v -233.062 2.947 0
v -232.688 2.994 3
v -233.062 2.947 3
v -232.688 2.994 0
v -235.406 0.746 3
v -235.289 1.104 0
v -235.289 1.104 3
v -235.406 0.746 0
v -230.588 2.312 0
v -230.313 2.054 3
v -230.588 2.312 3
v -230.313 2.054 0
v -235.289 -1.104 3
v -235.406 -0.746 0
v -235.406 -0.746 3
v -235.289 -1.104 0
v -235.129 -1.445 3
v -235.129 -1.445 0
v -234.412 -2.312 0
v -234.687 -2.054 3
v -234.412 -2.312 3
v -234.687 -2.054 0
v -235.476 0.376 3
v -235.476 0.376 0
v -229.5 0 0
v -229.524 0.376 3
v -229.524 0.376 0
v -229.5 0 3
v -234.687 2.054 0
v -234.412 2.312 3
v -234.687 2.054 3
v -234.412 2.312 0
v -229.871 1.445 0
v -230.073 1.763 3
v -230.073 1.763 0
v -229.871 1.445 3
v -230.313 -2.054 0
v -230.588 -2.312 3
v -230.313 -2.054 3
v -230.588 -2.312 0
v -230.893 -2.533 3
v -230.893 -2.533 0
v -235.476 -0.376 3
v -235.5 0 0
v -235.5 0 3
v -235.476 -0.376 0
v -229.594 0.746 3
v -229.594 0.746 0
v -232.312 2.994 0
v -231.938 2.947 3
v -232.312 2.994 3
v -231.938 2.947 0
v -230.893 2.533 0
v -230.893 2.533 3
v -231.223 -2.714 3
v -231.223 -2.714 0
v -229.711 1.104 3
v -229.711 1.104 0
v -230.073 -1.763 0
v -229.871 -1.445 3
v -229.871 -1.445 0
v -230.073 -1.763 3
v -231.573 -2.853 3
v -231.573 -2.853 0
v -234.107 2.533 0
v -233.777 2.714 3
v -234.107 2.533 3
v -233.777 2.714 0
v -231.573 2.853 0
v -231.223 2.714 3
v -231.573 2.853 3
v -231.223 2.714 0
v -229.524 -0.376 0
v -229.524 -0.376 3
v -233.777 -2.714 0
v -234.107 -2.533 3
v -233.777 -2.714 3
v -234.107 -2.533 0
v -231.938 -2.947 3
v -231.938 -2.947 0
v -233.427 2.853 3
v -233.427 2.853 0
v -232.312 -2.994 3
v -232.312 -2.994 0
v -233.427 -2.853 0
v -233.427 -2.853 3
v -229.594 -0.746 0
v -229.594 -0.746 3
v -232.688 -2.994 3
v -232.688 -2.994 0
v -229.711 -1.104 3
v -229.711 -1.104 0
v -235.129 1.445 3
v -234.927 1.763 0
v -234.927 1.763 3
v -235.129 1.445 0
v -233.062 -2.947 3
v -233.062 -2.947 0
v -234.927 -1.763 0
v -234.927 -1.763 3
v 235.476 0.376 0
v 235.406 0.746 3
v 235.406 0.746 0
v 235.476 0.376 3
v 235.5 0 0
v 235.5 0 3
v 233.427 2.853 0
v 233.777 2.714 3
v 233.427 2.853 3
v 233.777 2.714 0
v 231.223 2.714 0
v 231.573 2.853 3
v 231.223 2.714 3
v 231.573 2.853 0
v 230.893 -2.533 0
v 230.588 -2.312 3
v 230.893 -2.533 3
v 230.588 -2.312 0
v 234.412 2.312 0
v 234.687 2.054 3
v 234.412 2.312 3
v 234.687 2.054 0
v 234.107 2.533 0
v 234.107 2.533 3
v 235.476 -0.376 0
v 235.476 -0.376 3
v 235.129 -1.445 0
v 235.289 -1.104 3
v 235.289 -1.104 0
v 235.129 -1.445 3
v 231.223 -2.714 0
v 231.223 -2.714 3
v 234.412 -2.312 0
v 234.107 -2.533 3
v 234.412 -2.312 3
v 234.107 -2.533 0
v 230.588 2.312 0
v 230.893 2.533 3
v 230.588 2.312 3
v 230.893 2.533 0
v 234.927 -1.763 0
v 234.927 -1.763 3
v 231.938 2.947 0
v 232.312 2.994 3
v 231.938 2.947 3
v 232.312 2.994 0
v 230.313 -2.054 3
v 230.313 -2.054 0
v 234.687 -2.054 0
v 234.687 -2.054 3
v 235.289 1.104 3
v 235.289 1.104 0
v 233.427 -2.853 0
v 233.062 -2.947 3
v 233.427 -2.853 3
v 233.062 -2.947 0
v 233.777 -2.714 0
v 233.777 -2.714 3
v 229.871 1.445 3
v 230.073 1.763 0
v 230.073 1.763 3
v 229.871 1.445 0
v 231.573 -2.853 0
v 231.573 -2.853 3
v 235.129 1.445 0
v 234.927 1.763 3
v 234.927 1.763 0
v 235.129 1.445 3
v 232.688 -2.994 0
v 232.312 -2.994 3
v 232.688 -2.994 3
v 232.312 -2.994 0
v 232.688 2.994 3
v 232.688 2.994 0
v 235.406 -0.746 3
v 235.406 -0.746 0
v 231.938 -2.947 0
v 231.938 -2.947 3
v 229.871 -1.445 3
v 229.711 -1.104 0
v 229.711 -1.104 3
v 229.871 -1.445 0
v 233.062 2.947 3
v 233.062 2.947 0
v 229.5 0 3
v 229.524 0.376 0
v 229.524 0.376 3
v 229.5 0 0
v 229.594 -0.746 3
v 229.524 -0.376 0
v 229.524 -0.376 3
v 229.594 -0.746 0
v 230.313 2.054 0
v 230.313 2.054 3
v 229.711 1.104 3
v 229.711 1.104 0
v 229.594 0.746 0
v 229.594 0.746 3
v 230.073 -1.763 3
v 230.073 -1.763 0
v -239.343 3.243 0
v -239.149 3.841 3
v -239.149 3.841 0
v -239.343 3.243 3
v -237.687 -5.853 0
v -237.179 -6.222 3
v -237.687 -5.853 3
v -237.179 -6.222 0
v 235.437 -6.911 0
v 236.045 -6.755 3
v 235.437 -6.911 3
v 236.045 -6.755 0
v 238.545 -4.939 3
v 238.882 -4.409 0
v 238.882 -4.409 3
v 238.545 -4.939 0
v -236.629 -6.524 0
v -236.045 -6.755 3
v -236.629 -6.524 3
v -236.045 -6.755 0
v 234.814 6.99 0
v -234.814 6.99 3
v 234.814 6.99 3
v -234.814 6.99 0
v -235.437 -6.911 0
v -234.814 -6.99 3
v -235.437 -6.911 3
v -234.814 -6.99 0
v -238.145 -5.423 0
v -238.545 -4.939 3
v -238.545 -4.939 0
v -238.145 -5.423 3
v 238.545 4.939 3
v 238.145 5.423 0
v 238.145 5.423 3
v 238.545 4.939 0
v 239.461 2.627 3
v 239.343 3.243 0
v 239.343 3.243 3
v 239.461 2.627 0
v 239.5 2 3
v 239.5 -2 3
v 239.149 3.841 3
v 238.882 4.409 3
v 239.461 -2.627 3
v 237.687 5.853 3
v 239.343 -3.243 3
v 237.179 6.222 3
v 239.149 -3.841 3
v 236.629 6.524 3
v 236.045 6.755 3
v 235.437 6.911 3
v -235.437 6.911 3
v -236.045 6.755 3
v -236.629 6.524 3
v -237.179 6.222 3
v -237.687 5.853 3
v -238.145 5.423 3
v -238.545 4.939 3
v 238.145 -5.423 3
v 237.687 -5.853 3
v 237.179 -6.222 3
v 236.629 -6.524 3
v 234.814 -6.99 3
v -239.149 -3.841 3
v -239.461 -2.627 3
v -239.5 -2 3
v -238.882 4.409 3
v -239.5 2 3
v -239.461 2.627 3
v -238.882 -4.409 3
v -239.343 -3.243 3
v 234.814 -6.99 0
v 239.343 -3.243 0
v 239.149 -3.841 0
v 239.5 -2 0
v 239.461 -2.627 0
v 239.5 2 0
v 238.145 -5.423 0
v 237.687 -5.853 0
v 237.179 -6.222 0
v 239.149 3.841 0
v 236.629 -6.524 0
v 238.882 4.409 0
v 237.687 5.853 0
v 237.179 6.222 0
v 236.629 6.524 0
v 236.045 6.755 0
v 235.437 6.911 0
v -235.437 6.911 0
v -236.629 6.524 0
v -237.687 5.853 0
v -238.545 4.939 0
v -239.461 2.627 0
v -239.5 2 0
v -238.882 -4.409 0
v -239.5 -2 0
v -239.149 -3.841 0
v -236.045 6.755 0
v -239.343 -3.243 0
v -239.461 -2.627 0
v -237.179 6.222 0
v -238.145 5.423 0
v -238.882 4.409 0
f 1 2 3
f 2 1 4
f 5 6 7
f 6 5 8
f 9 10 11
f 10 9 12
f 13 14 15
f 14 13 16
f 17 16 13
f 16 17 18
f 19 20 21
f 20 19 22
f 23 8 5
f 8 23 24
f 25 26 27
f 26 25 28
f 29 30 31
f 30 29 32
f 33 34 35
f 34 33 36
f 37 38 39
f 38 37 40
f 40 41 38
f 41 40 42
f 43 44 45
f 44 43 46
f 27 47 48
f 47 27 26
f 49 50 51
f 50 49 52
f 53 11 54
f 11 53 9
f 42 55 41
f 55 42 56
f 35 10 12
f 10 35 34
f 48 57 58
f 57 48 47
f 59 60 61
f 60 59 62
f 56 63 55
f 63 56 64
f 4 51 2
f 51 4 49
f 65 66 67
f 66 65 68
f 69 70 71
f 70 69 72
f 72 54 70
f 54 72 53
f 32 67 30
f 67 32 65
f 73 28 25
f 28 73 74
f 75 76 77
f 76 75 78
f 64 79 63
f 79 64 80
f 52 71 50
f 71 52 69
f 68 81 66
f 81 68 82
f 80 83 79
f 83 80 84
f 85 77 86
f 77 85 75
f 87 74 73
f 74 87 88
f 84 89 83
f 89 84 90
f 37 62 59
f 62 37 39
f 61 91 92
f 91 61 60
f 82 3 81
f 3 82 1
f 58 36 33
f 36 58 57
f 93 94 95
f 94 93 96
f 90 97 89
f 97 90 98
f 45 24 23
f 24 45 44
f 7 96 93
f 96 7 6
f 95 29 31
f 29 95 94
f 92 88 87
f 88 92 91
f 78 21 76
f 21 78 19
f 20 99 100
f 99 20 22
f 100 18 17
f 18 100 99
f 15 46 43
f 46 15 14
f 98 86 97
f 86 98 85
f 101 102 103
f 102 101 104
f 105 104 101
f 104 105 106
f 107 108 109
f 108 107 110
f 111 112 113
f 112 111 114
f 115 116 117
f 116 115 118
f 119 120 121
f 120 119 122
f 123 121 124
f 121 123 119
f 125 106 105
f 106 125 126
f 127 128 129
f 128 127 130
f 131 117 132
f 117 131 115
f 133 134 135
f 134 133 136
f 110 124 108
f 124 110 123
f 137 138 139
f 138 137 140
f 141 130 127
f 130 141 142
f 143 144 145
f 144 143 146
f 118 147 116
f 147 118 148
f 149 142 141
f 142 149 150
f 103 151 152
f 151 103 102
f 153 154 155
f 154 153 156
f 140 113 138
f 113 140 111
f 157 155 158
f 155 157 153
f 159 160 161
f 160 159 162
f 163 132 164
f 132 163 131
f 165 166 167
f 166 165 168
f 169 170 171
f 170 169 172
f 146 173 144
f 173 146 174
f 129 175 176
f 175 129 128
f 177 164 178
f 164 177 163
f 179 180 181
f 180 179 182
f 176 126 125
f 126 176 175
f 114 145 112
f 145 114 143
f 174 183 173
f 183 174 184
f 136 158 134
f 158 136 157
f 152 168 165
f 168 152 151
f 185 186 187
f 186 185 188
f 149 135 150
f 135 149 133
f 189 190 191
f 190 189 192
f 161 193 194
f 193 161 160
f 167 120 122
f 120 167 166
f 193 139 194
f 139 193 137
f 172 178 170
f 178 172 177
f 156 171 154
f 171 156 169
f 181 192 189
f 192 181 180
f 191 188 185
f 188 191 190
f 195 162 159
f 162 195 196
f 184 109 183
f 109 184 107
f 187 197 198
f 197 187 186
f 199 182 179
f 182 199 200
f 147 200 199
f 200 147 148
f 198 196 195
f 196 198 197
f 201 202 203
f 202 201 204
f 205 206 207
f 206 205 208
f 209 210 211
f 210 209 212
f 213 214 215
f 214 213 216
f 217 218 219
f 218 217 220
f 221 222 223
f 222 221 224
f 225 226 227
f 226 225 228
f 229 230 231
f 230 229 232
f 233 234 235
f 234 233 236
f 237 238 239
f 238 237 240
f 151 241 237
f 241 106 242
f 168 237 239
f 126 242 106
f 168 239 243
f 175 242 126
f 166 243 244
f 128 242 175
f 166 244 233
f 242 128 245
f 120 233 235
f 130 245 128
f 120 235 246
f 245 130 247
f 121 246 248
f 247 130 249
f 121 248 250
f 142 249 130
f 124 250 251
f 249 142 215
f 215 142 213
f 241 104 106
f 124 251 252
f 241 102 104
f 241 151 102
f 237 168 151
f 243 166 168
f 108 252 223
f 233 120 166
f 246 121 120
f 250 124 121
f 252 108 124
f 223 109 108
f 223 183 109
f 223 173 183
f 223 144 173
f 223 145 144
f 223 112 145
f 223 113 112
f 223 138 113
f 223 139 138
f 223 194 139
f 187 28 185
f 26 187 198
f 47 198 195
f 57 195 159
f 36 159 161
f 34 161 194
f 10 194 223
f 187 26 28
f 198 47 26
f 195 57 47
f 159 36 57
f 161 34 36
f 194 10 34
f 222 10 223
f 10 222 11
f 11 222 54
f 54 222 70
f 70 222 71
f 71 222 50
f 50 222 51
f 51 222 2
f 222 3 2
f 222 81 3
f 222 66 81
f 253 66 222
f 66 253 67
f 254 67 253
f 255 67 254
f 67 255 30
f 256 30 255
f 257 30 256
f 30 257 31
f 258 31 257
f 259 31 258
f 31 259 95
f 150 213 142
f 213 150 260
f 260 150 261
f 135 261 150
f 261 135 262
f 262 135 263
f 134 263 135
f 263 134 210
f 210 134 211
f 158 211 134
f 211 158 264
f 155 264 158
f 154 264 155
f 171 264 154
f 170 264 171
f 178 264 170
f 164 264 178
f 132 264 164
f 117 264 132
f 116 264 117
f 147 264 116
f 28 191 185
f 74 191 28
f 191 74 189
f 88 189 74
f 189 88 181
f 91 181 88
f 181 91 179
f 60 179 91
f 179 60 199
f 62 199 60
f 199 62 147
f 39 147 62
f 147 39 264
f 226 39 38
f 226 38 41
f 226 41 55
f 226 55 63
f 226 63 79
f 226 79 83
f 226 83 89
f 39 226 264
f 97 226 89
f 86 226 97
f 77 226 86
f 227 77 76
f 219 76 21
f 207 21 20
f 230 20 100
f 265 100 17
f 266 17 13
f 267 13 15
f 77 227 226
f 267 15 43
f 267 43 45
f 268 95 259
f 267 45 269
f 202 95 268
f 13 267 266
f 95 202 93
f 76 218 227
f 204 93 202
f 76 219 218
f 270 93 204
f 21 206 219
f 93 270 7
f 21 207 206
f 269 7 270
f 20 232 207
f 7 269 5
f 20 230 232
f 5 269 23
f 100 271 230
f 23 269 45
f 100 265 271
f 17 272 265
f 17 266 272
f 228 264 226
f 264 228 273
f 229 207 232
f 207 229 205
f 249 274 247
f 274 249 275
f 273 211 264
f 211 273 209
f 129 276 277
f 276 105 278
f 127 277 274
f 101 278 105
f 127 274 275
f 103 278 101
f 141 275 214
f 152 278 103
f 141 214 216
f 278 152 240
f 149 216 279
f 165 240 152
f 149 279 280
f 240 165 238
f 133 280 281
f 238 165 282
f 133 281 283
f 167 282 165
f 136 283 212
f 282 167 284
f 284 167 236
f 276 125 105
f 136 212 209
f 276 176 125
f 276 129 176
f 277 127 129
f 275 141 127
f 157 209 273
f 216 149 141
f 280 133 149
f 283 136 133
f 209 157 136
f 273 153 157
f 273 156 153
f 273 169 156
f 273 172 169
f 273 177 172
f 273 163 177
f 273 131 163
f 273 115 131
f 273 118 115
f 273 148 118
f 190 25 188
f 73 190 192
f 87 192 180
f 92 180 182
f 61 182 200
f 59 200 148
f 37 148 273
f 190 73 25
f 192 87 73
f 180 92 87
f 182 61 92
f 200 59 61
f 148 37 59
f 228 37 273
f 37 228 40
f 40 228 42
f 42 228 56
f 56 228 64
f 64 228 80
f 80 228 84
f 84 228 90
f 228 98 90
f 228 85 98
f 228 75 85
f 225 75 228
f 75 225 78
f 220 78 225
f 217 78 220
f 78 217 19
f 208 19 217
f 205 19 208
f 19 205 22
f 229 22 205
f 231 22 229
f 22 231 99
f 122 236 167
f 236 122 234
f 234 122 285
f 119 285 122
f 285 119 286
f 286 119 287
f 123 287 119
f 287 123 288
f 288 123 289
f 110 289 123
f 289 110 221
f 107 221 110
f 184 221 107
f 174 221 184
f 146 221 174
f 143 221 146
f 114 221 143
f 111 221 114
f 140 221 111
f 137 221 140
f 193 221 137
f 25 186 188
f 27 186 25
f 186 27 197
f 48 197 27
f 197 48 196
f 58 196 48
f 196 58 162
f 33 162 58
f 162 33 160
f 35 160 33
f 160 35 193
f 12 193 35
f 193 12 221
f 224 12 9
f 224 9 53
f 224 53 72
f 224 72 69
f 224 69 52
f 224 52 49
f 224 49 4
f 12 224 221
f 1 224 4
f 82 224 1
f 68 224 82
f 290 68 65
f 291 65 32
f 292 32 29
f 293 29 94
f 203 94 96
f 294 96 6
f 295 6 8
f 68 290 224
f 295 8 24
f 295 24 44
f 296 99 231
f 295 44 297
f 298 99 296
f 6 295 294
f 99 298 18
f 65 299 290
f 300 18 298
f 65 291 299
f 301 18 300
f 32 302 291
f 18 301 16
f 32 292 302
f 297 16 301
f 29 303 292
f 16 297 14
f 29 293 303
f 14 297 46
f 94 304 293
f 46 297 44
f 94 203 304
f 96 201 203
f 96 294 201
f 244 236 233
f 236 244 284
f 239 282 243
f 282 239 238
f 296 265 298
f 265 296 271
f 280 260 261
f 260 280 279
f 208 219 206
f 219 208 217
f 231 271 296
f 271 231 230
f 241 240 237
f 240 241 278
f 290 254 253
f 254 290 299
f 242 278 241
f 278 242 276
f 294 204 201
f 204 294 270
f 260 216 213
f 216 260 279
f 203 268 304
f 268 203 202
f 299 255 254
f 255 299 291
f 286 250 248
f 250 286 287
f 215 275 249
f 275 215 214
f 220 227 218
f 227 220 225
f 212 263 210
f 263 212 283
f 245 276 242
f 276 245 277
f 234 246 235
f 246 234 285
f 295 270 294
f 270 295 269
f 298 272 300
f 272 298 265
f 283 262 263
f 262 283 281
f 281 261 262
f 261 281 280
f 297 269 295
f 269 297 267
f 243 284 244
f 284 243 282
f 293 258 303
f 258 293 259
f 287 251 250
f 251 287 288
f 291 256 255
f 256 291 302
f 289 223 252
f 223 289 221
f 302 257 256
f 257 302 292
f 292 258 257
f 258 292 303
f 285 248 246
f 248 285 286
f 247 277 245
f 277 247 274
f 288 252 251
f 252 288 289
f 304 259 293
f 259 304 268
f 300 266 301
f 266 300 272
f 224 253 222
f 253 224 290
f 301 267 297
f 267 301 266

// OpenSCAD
$fn = 50;


difference() {
	union() {
		hull() {
			translate(v = [-234.5000000000, 2.0000000000, 0]) {
				cylinder(h = 3, r = 5);
			}
			translate(v = [234.5000000000, 2.0000000000, 0]) {
				cylinder(h = 3, r = 5);
			}
			translate(v = [-234.5000000000, -2.0000000000, 0]) {
				cylinder(h = 3, r = 5);
			}
			translate(v = [234.5000000000, -2.0000000000, 0]) {
				cylinder(h = 3, r = 5);
			}
		}
	}
	union() {
		translate(v = [-232.5000000000, 0.0000000000, -100.0000000000]) {
			cylinder(h = 200, r = 3.0000000000);
		}
		translate(v = [-232.5000000000, 0.0000000000, -100.0000000000]) {
			cylinder(h = 200, r = 3.0000000000);
		}
		translate(v = [232.5000000000, 0.0000000000, -100.0000000000]) {
			cylinder(h = 200, r = 3.0000000000);
		}
		translate(v = [232.5000000000, 0.0000000000, -100.0000000000]) {
			cylinder(h = 200, r = 3.0000000000);
		}
	}
}
